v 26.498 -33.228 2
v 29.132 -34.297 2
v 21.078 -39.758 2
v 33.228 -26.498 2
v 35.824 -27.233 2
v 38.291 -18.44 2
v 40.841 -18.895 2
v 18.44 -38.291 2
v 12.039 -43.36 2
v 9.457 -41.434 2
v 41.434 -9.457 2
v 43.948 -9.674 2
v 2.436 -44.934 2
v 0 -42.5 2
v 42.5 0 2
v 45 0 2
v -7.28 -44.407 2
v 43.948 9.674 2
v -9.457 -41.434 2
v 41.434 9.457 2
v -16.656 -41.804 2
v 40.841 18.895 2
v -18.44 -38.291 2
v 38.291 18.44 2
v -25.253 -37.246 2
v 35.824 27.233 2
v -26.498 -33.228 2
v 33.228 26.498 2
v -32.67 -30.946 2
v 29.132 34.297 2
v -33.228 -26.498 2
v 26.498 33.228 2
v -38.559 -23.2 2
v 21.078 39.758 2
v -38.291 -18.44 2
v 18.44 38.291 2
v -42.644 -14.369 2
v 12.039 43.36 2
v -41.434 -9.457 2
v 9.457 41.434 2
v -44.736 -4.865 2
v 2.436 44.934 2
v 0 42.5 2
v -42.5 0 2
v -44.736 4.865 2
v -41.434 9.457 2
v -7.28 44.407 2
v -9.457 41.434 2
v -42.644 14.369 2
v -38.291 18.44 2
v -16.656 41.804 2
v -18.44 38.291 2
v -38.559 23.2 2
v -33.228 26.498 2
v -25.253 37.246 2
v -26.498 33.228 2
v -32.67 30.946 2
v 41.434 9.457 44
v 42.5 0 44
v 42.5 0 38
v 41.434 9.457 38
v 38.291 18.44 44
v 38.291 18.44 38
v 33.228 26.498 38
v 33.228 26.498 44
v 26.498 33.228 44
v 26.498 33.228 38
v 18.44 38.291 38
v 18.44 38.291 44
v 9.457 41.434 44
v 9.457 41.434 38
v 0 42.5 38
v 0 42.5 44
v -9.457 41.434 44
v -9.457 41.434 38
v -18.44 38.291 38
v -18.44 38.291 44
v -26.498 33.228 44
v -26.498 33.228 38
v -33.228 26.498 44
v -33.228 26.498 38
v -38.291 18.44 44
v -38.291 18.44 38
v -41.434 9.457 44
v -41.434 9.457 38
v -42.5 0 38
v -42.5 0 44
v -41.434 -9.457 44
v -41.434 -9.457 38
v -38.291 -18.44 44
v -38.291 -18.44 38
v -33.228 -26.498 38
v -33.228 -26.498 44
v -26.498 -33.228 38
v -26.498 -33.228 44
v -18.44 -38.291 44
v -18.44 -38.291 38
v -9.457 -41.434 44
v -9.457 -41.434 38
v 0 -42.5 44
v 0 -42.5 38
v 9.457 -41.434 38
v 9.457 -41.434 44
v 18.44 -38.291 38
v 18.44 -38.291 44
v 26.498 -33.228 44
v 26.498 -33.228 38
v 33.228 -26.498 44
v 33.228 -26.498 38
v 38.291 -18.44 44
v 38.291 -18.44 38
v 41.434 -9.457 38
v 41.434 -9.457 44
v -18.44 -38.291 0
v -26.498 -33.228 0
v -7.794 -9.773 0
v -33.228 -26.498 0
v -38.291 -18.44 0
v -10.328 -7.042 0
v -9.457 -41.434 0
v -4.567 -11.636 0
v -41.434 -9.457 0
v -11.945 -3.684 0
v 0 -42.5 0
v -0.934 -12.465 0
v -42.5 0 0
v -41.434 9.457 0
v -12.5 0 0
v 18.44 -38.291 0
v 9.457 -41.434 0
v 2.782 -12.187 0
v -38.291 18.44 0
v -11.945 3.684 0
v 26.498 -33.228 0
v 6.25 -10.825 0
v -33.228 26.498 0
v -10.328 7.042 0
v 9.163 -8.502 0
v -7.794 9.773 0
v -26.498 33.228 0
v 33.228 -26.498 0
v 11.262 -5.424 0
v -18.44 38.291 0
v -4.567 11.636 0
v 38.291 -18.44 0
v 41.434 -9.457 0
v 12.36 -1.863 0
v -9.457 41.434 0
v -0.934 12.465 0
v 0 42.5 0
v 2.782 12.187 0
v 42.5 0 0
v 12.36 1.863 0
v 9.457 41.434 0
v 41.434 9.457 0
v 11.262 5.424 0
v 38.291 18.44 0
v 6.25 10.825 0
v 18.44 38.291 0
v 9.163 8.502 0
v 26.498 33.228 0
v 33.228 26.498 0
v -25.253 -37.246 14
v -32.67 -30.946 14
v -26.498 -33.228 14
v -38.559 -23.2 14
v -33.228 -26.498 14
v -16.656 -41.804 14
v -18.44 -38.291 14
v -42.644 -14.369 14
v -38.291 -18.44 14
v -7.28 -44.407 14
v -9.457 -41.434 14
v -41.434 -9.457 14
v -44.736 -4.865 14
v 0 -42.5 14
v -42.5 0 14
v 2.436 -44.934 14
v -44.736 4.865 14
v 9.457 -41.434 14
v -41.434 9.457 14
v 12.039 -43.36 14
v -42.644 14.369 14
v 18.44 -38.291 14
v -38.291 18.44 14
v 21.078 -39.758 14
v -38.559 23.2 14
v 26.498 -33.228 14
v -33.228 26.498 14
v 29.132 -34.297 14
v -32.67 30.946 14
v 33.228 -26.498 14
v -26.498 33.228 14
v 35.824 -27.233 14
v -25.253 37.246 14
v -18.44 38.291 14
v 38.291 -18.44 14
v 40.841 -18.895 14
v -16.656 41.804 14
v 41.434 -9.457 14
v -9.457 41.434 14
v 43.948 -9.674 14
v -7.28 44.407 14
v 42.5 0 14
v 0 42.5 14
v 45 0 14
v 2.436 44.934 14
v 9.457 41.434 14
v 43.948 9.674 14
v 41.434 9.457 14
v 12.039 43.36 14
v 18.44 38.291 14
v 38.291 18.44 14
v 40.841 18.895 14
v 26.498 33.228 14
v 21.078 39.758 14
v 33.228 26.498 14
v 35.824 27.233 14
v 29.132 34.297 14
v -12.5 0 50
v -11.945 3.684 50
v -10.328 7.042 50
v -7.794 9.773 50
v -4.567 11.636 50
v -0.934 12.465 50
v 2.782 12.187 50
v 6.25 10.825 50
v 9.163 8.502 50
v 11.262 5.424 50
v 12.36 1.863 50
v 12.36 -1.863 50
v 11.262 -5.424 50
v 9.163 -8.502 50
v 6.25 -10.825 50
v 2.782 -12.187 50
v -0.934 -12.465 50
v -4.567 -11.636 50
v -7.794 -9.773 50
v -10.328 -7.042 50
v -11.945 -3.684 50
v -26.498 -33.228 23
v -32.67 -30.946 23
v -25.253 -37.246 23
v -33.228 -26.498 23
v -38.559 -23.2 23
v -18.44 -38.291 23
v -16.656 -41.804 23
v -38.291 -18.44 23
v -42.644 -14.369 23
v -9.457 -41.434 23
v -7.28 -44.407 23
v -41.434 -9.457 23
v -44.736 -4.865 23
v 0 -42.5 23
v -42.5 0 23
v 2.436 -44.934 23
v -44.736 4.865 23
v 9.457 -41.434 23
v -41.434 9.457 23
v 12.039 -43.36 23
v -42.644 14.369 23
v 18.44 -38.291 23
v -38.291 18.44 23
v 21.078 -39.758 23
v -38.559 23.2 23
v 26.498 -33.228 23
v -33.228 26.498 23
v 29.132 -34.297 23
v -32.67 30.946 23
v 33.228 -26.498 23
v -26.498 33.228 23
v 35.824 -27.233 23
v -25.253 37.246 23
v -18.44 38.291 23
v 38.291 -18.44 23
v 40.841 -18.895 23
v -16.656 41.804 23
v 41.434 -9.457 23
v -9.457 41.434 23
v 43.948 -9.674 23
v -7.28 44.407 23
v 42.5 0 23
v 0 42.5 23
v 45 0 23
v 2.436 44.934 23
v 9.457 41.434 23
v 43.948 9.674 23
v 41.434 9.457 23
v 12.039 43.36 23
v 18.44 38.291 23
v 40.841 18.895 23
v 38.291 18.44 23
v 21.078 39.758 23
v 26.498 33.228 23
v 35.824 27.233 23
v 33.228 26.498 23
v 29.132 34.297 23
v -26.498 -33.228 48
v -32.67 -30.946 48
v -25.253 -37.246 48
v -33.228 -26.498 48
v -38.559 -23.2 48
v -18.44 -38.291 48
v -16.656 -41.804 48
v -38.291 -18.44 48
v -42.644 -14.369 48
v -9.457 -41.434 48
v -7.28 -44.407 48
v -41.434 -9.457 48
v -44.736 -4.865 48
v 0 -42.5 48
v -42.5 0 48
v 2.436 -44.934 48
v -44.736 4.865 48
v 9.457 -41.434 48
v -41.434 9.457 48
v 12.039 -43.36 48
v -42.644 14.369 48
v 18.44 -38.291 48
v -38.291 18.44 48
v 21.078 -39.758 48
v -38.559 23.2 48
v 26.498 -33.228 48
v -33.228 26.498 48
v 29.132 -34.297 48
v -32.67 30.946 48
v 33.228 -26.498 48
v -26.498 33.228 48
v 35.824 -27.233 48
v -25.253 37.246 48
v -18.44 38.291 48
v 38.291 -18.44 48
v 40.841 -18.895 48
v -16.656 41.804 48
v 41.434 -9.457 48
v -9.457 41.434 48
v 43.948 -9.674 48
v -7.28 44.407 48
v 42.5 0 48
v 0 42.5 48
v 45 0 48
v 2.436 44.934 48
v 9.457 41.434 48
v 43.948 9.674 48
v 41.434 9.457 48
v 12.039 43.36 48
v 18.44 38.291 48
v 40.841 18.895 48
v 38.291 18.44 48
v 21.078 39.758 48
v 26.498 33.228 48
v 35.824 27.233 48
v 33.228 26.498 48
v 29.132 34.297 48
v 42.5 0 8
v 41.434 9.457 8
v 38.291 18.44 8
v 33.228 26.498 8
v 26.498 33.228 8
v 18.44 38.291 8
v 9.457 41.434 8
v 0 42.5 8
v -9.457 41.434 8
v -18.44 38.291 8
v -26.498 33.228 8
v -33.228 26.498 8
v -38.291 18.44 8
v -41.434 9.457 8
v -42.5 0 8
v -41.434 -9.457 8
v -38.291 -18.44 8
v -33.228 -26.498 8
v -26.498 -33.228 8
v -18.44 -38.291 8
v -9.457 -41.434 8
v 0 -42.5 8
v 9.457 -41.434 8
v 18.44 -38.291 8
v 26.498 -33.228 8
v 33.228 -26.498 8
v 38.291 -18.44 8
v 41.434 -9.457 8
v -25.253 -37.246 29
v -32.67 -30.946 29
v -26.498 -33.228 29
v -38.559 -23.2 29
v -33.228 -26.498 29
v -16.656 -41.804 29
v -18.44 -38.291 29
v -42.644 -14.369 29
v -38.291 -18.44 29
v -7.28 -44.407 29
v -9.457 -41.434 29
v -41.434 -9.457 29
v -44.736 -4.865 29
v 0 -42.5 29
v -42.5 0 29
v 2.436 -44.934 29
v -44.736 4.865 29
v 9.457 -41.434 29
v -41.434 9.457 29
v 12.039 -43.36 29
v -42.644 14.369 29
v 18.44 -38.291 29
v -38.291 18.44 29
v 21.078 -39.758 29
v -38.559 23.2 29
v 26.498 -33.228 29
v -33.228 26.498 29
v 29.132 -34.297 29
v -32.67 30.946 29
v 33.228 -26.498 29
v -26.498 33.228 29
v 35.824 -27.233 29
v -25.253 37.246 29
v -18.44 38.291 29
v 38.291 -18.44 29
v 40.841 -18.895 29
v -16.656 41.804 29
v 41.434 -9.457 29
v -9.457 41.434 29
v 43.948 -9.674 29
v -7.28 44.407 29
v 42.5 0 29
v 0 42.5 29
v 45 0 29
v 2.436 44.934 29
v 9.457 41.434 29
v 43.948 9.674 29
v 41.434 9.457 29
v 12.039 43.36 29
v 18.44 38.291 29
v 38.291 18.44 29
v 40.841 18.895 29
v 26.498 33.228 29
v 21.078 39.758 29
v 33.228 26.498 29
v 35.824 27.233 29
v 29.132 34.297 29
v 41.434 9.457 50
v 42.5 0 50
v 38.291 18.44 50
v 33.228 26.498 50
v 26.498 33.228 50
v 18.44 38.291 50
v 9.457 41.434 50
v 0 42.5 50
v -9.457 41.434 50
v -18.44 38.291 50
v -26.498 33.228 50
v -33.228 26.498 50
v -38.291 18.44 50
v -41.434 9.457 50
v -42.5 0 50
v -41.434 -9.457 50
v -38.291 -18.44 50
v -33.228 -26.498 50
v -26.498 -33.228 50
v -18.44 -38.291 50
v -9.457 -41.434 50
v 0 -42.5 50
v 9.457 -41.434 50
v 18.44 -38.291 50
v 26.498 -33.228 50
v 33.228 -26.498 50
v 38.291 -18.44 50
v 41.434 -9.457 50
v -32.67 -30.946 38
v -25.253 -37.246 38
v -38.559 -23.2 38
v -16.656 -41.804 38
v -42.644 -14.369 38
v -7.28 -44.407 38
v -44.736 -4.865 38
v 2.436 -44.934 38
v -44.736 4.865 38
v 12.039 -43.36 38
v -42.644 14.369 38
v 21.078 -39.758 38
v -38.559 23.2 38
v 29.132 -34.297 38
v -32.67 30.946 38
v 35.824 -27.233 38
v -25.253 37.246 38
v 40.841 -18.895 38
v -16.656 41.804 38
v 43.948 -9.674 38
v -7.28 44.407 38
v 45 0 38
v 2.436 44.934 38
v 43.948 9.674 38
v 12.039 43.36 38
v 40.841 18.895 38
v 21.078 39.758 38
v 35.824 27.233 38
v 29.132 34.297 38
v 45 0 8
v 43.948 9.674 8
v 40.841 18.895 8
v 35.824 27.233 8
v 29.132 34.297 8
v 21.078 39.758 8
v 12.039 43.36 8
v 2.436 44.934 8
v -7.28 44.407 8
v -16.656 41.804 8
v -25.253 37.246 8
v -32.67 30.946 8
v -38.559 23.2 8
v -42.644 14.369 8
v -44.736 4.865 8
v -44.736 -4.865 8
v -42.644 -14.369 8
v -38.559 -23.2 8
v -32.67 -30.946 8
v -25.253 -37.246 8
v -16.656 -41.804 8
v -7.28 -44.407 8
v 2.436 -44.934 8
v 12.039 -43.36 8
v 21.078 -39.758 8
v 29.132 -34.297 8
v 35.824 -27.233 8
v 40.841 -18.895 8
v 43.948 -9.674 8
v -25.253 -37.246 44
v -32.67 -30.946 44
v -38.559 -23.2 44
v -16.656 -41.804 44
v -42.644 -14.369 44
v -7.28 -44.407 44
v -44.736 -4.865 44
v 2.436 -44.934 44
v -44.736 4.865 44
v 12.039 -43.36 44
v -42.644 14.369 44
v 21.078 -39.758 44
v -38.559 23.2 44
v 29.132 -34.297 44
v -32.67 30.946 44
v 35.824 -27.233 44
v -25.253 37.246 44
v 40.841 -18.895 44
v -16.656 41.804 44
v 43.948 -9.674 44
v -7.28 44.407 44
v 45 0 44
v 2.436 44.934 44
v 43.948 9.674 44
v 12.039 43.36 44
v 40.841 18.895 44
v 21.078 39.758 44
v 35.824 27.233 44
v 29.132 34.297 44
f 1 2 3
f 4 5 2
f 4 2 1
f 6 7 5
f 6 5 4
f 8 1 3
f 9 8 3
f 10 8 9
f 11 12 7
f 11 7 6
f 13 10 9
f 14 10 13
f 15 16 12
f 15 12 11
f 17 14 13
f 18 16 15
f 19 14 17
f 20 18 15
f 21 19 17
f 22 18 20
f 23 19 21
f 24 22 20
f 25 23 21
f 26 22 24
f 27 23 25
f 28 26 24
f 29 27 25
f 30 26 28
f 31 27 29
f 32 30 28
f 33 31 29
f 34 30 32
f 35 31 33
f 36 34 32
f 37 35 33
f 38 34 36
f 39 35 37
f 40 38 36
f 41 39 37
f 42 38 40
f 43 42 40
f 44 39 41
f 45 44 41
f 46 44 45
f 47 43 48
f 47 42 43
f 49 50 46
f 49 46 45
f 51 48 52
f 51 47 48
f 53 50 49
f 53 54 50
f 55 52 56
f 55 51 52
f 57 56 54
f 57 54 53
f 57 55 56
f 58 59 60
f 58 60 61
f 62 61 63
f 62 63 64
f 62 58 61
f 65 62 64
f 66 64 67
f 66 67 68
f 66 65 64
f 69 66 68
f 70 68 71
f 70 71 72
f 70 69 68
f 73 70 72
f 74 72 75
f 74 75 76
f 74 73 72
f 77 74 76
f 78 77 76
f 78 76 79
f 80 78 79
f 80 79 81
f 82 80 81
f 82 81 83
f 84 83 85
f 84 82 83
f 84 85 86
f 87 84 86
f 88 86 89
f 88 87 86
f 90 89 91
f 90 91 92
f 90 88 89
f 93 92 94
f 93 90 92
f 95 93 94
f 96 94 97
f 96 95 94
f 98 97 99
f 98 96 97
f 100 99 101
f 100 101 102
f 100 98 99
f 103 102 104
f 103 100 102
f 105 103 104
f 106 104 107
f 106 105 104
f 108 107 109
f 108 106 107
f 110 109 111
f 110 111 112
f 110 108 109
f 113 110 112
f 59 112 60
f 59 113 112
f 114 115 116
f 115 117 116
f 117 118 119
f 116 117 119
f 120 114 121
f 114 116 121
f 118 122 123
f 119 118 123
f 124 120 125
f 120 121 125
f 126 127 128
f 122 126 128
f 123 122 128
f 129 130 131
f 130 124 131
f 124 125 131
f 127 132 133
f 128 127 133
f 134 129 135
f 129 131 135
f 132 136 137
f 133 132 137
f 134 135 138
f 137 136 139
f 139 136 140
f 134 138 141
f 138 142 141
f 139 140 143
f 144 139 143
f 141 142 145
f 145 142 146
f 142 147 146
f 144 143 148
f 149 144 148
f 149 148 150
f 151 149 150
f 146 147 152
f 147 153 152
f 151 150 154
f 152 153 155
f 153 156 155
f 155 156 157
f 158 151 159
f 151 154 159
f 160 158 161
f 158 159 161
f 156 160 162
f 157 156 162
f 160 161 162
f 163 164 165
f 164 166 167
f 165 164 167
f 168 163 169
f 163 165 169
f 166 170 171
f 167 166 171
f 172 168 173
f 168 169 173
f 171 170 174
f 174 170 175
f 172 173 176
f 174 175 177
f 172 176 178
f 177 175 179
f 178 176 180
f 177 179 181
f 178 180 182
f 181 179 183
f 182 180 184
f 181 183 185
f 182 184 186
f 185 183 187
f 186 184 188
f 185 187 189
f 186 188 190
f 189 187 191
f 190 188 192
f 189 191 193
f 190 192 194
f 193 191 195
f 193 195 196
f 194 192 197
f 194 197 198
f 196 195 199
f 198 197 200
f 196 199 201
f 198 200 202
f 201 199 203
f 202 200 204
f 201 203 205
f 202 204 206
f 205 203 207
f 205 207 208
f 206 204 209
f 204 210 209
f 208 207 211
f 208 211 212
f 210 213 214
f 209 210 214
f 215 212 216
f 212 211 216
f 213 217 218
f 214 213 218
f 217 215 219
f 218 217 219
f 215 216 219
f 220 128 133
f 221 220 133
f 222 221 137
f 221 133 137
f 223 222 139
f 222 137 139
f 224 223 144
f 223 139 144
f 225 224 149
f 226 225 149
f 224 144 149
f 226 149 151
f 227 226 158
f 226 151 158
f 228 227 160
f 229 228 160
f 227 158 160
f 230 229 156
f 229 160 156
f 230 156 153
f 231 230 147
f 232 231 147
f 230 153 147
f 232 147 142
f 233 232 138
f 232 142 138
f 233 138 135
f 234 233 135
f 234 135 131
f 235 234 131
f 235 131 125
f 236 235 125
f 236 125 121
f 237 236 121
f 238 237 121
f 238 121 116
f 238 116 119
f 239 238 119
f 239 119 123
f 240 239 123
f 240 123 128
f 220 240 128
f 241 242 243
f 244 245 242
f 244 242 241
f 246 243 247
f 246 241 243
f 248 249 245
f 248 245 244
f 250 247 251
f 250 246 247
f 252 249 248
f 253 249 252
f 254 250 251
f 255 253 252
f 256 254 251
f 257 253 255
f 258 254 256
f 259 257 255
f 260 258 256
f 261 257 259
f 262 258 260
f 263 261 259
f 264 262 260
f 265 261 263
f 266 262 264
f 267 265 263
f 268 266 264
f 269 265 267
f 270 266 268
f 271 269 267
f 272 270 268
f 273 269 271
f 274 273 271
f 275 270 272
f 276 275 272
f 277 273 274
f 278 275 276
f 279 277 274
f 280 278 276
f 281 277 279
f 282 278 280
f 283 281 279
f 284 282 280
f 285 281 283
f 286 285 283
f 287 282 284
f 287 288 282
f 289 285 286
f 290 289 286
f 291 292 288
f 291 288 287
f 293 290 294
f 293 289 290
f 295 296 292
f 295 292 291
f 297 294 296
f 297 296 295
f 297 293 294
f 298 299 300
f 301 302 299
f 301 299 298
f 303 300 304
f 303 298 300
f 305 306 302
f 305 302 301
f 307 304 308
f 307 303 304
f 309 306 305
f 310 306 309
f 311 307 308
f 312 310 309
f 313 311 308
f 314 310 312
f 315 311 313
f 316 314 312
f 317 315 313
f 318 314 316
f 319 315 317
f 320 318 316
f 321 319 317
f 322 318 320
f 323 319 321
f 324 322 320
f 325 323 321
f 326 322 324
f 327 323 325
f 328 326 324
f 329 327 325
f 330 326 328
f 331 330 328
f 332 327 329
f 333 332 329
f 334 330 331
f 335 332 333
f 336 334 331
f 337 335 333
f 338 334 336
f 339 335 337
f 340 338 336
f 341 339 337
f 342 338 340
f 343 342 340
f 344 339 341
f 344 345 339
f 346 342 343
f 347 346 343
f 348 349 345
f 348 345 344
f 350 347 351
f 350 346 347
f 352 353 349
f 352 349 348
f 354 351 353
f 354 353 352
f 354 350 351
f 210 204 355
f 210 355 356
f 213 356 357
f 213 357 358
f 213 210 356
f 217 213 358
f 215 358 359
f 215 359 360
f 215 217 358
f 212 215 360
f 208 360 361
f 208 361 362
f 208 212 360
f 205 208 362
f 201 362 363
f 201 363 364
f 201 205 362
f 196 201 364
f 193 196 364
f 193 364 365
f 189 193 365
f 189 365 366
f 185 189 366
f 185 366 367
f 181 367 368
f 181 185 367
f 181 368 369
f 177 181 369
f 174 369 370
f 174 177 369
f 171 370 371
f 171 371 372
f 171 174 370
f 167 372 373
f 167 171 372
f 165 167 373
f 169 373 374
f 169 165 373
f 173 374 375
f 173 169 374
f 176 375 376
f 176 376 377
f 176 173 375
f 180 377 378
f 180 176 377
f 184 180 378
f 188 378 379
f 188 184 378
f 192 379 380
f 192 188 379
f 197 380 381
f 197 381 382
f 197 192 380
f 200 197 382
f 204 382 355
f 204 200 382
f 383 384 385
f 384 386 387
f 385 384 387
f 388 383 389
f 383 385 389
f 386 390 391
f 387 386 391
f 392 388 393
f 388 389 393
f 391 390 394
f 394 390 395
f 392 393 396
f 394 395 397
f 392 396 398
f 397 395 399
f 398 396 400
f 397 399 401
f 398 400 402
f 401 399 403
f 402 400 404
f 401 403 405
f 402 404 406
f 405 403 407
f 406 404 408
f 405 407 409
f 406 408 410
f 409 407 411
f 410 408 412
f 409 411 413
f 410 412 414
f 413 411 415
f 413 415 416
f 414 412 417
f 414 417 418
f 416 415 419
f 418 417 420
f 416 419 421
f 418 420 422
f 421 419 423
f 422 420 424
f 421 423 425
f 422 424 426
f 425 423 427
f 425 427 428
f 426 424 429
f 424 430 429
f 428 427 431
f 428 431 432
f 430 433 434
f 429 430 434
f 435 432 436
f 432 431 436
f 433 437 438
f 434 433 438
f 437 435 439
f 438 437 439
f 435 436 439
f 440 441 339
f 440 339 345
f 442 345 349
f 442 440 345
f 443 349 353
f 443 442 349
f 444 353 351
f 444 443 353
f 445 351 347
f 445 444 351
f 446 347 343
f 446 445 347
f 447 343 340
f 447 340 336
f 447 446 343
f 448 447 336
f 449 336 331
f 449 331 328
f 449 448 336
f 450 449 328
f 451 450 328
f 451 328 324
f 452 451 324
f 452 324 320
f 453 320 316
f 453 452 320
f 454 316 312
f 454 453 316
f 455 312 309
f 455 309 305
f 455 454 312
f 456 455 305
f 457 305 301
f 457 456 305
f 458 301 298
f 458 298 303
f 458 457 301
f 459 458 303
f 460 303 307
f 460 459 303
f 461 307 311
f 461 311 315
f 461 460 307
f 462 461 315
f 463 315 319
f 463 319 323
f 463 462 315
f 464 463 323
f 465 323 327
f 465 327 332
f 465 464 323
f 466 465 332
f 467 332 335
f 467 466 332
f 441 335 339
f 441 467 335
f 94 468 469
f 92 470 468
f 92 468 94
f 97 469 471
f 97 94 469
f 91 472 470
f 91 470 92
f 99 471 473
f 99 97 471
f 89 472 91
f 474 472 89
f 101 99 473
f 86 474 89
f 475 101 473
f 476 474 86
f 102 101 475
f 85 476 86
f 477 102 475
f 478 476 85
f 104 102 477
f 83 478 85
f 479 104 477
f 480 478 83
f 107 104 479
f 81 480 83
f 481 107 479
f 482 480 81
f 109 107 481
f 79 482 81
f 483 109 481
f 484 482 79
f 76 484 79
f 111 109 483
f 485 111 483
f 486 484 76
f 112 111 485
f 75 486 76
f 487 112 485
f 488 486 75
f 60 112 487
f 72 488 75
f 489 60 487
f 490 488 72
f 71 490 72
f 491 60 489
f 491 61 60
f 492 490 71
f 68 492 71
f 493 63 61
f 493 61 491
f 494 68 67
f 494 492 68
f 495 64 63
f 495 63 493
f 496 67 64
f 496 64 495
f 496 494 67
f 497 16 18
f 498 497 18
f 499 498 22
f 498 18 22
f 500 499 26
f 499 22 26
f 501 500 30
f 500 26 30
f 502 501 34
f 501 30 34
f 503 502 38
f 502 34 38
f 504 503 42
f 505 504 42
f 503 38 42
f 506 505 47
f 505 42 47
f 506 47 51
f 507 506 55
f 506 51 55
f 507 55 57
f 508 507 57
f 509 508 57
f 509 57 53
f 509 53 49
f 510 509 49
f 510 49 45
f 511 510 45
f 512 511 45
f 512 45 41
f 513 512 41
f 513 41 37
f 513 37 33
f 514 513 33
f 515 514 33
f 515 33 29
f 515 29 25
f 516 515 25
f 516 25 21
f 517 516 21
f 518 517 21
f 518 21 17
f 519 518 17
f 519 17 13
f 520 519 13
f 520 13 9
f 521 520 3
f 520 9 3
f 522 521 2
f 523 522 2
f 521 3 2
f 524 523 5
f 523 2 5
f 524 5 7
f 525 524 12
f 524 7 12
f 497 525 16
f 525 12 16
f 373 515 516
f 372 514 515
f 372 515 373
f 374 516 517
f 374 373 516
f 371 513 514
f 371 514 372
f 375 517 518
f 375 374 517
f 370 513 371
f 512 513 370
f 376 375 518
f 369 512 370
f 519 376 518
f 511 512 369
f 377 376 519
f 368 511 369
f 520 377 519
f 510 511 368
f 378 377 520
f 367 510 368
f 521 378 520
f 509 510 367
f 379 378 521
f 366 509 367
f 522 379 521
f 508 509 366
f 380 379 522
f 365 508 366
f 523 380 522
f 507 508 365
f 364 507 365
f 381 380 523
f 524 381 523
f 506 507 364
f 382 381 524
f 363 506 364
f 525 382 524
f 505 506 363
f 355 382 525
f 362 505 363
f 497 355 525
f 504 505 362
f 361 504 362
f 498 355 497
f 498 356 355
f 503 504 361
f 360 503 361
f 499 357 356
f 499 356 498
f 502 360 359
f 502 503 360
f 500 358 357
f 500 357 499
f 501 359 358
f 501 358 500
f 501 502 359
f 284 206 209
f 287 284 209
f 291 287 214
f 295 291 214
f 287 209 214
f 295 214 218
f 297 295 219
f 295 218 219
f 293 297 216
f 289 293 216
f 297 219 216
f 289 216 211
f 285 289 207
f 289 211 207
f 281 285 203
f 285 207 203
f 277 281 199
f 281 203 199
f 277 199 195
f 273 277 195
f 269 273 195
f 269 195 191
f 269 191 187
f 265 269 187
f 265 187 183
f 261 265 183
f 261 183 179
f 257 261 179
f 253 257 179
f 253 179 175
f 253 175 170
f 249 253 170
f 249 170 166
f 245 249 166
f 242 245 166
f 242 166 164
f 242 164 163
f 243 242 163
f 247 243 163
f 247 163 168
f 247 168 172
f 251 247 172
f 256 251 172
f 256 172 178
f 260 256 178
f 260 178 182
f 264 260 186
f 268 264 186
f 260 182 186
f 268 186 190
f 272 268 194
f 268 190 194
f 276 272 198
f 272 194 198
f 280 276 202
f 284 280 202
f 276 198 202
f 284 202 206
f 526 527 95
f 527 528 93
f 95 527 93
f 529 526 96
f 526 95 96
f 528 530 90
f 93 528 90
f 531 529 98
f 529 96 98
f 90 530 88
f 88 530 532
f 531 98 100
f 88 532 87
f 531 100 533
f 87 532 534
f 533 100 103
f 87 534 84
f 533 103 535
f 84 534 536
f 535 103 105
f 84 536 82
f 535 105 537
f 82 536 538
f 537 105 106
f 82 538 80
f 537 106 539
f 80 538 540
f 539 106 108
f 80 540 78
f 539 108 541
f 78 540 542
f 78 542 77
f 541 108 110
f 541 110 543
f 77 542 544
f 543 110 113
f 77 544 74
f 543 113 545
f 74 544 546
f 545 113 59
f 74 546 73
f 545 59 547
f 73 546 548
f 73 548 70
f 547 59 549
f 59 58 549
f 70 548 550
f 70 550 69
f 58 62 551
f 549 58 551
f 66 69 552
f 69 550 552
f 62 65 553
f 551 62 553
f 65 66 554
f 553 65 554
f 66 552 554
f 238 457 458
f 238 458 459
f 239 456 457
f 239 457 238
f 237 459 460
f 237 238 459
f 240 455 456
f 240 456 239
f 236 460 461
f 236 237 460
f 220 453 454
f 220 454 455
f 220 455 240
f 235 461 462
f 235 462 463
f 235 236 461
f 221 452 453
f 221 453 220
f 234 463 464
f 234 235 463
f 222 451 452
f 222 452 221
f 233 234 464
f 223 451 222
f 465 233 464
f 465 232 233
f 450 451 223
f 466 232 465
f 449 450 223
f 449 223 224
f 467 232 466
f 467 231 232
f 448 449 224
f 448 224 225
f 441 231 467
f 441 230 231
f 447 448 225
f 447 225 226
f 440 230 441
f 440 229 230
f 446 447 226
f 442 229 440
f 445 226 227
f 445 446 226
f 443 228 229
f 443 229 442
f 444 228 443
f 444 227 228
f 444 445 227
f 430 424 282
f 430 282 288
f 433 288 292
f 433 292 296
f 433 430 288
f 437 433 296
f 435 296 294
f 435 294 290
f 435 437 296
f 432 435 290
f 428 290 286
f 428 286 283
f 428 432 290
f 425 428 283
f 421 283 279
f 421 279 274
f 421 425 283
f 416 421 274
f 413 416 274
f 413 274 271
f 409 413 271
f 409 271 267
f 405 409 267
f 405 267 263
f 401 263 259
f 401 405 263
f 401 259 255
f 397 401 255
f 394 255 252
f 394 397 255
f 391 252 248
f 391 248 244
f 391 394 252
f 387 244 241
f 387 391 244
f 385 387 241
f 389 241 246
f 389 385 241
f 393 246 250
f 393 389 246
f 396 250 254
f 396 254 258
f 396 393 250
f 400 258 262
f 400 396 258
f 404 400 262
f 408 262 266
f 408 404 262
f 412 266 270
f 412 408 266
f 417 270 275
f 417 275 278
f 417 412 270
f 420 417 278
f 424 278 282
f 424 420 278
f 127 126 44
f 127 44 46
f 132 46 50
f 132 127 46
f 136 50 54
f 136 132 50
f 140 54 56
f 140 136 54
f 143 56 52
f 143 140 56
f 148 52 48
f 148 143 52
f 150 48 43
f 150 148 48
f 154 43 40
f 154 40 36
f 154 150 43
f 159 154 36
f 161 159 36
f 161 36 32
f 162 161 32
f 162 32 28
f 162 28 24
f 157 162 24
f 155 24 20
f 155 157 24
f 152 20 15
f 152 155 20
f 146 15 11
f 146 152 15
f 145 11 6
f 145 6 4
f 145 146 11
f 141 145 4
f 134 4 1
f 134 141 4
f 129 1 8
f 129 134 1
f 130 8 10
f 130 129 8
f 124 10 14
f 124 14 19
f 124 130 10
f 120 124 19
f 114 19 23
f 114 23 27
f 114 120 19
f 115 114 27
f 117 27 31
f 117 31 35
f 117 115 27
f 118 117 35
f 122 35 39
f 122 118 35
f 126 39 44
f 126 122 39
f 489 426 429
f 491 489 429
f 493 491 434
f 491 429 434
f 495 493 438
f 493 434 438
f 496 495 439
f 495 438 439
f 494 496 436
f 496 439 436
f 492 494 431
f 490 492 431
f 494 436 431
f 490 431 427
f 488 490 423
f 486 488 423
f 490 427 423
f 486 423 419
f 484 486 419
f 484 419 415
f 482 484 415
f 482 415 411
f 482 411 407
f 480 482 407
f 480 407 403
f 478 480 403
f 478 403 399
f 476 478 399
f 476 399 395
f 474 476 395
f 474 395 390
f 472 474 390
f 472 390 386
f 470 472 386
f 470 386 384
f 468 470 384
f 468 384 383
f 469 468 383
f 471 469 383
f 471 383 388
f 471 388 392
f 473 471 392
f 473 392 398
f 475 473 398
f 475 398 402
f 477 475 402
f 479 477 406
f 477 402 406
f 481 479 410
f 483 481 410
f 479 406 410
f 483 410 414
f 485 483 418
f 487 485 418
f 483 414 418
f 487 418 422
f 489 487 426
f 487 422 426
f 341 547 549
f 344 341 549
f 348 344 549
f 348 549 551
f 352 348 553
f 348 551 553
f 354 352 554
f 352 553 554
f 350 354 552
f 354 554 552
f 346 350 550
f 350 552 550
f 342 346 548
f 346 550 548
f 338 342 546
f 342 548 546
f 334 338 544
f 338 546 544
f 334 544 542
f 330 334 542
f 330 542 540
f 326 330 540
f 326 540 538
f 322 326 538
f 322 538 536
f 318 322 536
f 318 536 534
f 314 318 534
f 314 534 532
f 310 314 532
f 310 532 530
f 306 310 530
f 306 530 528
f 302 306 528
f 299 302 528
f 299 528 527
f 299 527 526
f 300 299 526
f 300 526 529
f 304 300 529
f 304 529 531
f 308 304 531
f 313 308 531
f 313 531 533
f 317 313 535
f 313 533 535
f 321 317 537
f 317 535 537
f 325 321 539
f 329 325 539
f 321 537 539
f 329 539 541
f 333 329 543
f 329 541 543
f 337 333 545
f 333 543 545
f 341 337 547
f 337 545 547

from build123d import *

# Parameters (mm, degrees)
SKETCH_1_R             = 45
EXTRUDE_1_DEPTH        = 50
CUT_EXTRUDE_START      = -6
SKETCH_2_R             = 45
SKETCH_2_R_2           = 42.5
CUT_EXTRUDE_1_DEPTH    = 6
PATTERN_LINEAR_1_COUNT = 3
PATTERN_LINEAR_1_PITCH = 15
SKETCH_3_R             = 45
SKETCH_3_R_2           = 42.5
CUT_EXTRUDE_2_DEPTH    = 2
SKETCH_4_R             = 45
SKETCH_4_R_2           = 42.5
CUT_EXTRUDE_4_DEPTH    = 2
SKETCH_5_R             = 12.5
CUT_EXTRUDE_5_DEPTH    = 51


with BuildPart() as part:
    # 草图1 → 凸台-拉伸1 (new body)
    with BuildSketch(Plane.XY):
        Circle(SKETCH_1_R)
    extrude(amount=EXTRUDE_1_DEPTH)

    # 草图2 → 切除-拉伸1 (cut)
    with BuildSketch(Plane.XY.offset(50).offset(CUT_EXTRUDE_START)):
        Circle(SKETCH_2_R)
        Circle(SKETCH_2_R_2, mode=Mode.SUBTRACT)
    cut_extrude_1 = extrude(amount=-CUT_EXTRUDE_1_DEPTH, mode=Mode.SUBTRACT)

    # 阵列(线性)1: 切除-拉伸1 ×3
    with Locations(*[(0, 0, -i * PATTERN_LINEAR_1_PITCH) for i in range(1, PATTERN_LINEAR_1_COUNT)]):
        add(cut_extrude_1, mode=Mode.SUBTRACT)

    # 草图3 → 切除-拉伸2 (cut)
    with BuildSketch(Plane.XY.offset(50)):
        Circle(SKETCH_3_R)
        Circle(SKETCH_3_R_2, mode=Mode.SUBTRACT)
    extrude(amount=-CUT_EXTRUDE_2_DEPTH, mode=Mode.SUBTRACT)

    # 草图4 → 切除-拉伸4 (cut)
    with BuildSketch(Plane(origin=(0, 0, 0), x_dir=(-1, 0, 0), z_dir=(0, 0, -1))):
        Circle(SKETCH_4_R)
        Circle(SKETCH_4_R_2, mode=Mode.SUBTRACT)
    extrude(amount=-CUT_EXTRUDE_4_DEPTH, mode=Mode.SUBTRACT)

    # 草图5 → 切除-拉伸5 (cut, through all)
    with BuildSketch(Plane(origin=(0, 0, 0), x_dir=(-1, 0, 0), z_dir=(0, 0, -1))):
        Circle(SKETCH_5_R)
    extrude(amount=-CUT_EXTRUDE_5_DEPTH, mode=Mode.SUBTRACT)


solid = part.part
